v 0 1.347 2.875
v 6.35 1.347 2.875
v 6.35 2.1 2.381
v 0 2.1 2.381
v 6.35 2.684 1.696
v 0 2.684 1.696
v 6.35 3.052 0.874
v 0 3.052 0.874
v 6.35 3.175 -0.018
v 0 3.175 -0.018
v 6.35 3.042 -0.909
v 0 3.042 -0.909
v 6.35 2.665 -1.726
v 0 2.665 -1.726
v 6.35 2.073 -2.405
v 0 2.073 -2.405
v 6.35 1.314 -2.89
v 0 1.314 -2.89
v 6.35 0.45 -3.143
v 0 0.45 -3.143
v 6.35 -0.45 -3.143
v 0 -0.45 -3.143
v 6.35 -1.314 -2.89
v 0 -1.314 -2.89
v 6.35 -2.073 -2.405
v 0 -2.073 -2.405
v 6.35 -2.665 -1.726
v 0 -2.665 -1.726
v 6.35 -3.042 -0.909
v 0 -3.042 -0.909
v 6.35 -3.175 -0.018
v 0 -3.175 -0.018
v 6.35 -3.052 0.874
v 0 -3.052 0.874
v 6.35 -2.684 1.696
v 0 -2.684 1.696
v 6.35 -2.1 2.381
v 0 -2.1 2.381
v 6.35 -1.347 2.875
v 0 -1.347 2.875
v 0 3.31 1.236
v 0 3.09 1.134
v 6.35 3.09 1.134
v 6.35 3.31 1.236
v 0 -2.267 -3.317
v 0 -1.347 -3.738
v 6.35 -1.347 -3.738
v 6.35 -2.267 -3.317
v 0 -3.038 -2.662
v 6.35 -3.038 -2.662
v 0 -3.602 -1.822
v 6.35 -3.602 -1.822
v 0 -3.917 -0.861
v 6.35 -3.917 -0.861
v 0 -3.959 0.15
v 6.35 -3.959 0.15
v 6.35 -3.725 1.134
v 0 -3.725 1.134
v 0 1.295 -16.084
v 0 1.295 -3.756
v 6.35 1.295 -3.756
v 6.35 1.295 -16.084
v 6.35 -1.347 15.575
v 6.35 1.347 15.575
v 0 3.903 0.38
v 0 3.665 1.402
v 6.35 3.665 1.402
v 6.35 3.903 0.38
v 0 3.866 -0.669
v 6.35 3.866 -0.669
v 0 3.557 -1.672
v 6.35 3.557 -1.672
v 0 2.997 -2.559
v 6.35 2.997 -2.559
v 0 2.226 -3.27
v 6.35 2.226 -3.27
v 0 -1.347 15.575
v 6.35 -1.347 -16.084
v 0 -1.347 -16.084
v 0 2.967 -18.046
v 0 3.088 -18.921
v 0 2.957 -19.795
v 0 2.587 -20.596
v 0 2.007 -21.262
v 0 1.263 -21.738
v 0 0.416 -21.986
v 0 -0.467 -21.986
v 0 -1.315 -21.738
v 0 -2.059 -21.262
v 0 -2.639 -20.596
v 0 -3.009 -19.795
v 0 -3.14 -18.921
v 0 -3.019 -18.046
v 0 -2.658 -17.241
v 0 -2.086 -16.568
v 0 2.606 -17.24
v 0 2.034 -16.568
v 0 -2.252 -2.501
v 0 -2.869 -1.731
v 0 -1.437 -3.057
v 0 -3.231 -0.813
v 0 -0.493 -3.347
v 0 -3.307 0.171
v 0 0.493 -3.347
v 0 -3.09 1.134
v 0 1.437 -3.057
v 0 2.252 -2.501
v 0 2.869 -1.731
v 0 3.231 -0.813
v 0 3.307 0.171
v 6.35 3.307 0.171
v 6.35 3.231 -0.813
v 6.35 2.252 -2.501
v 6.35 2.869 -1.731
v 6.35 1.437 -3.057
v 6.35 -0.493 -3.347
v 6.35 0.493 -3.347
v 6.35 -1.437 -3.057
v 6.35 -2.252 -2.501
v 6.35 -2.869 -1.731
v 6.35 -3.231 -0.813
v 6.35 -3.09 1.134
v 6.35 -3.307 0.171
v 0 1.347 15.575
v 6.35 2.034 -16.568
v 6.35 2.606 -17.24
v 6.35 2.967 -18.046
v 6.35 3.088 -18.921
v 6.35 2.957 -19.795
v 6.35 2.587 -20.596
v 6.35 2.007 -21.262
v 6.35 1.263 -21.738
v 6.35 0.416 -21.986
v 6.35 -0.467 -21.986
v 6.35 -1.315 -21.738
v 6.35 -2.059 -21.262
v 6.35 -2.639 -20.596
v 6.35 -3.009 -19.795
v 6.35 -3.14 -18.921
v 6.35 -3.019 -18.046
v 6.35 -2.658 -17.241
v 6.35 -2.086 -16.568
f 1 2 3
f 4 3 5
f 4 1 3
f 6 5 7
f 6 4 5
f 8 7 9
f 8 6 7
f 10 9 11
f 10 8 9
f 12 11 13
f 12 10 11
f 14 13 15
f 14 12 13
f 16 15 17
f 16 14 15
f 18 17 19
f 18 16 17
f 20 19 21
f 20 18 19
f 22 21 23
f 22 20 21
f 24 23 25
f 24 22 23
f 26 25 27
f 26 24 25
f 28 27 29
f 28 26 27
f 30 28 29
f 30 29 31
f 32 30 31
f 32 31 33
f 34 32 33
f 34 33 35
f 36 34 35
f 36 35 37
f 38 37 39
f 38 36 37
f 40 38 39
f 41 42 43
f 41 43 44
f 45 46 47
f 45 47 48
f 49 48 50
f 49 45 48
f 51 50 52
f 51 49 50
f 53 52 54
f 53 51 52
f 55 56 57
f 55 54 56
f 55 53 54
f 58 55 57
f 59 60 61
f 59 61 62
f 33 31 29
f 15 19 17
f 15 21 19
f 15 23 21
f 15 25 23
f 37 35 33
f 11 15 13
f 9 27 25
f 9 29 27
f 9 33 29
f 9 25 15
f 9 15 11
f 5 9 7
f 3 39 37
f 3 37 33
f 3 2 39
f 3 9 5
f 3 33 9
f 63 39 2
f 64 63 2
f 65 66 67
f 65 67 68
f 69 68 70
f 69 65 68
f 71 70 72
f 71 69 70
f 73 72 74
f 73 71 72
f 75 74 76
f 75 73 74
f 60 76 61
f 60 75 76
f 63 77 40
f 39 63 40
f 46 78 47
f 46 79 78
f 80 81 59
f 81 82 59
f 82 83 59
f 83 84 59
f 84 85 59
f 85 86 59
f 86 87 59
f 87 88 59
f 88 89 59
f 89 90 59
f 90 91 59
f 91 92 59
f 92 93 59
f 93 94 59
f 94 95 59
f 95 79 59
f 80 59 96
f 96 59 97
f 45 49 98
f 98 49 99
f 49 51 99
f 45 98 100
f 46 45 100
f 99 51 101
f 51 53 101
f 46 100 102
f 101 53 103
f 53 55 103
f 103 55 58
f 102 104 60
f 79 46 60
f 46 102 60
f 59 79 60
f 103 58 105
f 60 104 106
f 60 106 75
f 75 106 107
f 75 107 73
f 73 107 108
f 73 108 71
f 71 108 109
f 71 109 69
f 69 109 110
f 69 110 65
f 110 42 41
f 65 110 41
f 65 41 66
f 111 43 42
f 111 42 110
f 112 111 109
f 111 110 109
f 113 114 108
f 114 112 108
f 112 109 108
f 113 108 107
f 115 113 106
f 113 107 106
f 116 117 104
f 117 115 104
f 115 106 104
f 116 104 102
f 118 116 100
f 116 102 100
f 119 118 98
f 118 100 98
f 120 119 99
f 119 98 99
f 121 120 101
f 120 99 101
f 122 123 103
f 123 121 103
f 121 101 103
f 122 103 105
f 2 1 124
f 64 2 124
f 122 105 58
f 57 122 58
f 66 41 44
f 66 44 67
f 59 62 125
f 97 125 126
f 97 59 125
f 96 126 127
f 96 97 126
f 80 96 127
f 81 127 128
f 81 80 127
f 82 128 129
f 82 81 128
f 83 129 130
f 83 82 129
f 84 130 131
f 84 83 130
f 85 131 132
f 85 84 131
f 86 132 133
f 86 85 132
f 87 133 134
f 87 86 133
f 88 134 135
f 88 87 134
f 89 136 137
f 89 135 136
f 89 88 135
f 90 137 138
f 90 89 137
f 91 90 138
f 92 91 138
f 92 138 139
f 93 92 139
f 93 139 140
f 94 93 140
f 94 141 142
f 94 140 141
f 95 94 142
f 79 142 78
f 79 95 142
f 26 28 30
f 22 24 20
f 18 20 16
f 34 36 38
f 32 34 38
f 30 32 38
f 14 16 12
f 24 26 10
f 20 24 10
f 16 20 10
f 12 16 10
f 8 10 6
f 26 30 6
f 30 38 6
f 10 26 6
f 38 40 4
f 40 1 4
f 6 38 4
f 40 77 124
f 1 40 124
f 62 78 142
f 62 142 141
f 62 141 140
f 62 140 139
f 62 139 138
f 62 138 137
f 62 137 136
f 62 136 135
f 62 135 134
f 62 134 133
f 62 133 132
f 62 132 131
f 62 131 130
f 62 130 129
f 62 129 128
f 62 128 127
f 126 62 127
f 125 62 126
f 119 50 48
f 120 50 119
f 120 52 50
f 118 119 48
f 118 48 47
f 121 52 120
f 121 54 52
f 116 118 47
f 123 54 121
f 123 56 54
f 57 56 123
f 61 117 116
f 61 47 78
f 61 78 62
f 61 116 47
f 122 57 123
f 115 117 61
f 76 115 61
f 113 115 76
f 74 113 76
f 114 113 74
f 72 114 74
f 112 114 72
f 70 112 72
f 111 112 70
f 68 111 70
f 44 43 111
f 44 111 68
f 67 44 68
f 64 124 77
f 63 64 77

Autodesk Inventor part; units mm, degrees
ref_plane "YZ Plane" through (0, 0, 0) normal (1, 0, 0) x (0, 1, 0)
ref_plane "XZ Plane" through (0, 0, 0) normal (0, 1, 0) x (-1, 0, 0)
ref_plane "XY Plane" through (0, 0, 0) normal (0, 0, 1) x (1, 0, 0)
sketch "Sketch1" plane through (0, 0, 0) normal (1, 0, 0) x (0, 1, 0)
  circle A0 centre (0, 0) radius 3.175
  line L0 (1.3472, 2.875) -> (1.3472, 15.575)
  line L1 (1.3472, 15.575) -> (-1.3472, 15.575)
  line L2 (-1.3472, 15.575) -> (-1.3472, 2.875)
  arc A1 (1.3472, 2.875) -> (-1.3472, 2.875) centre (0, 0) ccw
  arc A2 (-3.0896, 1.1338) -> (3.0896, 1.1338) centre (0, -0.0687) ccw
  line L3 (-3.0896, 1.1338) -> (-3.3549, 1.1338)
  line L4 (3.0896, 1.1338) -> (3.3102, 1.2365)
  circle A3 centre (-0.026, -18.9035) radius 3.1136
  arc A4 (1.2951, -16.0841) -> (-1.3472, -16.0841) centre (-0.026, -18.9035) ccw
  line L5 (3.0896, 1.1338) -> (3.6653, 1.4017)
  line L6 (-3.0896, 1.1338) -> (-3.7246, 1.1338)
  arc A5 (-3.7246, 1.1338) -> (-1.3472, -3.7376) centre (-0.2877, -0.2047) ccw
  arc A6 (1.2951, -3.7556) -> (3.6653, 1.4017) centre (-0.0687, -0.0056) ccw
  line L7 (1.2951, -3.7556) -> (1.2951, -16.0841)
  line L8 (-1.3472, -16.0841) -> (-1.3472, -3.7376)
  dimension "d0" = 6.35
  dimension "d4" = 12.7
  dimension "d12" = 0.635
  dimension "d13" = 0.635
extrude "Extrusion2" add sketch "Sketch1" along normal blind 6.35
properties part number "turtlearmJoints"
